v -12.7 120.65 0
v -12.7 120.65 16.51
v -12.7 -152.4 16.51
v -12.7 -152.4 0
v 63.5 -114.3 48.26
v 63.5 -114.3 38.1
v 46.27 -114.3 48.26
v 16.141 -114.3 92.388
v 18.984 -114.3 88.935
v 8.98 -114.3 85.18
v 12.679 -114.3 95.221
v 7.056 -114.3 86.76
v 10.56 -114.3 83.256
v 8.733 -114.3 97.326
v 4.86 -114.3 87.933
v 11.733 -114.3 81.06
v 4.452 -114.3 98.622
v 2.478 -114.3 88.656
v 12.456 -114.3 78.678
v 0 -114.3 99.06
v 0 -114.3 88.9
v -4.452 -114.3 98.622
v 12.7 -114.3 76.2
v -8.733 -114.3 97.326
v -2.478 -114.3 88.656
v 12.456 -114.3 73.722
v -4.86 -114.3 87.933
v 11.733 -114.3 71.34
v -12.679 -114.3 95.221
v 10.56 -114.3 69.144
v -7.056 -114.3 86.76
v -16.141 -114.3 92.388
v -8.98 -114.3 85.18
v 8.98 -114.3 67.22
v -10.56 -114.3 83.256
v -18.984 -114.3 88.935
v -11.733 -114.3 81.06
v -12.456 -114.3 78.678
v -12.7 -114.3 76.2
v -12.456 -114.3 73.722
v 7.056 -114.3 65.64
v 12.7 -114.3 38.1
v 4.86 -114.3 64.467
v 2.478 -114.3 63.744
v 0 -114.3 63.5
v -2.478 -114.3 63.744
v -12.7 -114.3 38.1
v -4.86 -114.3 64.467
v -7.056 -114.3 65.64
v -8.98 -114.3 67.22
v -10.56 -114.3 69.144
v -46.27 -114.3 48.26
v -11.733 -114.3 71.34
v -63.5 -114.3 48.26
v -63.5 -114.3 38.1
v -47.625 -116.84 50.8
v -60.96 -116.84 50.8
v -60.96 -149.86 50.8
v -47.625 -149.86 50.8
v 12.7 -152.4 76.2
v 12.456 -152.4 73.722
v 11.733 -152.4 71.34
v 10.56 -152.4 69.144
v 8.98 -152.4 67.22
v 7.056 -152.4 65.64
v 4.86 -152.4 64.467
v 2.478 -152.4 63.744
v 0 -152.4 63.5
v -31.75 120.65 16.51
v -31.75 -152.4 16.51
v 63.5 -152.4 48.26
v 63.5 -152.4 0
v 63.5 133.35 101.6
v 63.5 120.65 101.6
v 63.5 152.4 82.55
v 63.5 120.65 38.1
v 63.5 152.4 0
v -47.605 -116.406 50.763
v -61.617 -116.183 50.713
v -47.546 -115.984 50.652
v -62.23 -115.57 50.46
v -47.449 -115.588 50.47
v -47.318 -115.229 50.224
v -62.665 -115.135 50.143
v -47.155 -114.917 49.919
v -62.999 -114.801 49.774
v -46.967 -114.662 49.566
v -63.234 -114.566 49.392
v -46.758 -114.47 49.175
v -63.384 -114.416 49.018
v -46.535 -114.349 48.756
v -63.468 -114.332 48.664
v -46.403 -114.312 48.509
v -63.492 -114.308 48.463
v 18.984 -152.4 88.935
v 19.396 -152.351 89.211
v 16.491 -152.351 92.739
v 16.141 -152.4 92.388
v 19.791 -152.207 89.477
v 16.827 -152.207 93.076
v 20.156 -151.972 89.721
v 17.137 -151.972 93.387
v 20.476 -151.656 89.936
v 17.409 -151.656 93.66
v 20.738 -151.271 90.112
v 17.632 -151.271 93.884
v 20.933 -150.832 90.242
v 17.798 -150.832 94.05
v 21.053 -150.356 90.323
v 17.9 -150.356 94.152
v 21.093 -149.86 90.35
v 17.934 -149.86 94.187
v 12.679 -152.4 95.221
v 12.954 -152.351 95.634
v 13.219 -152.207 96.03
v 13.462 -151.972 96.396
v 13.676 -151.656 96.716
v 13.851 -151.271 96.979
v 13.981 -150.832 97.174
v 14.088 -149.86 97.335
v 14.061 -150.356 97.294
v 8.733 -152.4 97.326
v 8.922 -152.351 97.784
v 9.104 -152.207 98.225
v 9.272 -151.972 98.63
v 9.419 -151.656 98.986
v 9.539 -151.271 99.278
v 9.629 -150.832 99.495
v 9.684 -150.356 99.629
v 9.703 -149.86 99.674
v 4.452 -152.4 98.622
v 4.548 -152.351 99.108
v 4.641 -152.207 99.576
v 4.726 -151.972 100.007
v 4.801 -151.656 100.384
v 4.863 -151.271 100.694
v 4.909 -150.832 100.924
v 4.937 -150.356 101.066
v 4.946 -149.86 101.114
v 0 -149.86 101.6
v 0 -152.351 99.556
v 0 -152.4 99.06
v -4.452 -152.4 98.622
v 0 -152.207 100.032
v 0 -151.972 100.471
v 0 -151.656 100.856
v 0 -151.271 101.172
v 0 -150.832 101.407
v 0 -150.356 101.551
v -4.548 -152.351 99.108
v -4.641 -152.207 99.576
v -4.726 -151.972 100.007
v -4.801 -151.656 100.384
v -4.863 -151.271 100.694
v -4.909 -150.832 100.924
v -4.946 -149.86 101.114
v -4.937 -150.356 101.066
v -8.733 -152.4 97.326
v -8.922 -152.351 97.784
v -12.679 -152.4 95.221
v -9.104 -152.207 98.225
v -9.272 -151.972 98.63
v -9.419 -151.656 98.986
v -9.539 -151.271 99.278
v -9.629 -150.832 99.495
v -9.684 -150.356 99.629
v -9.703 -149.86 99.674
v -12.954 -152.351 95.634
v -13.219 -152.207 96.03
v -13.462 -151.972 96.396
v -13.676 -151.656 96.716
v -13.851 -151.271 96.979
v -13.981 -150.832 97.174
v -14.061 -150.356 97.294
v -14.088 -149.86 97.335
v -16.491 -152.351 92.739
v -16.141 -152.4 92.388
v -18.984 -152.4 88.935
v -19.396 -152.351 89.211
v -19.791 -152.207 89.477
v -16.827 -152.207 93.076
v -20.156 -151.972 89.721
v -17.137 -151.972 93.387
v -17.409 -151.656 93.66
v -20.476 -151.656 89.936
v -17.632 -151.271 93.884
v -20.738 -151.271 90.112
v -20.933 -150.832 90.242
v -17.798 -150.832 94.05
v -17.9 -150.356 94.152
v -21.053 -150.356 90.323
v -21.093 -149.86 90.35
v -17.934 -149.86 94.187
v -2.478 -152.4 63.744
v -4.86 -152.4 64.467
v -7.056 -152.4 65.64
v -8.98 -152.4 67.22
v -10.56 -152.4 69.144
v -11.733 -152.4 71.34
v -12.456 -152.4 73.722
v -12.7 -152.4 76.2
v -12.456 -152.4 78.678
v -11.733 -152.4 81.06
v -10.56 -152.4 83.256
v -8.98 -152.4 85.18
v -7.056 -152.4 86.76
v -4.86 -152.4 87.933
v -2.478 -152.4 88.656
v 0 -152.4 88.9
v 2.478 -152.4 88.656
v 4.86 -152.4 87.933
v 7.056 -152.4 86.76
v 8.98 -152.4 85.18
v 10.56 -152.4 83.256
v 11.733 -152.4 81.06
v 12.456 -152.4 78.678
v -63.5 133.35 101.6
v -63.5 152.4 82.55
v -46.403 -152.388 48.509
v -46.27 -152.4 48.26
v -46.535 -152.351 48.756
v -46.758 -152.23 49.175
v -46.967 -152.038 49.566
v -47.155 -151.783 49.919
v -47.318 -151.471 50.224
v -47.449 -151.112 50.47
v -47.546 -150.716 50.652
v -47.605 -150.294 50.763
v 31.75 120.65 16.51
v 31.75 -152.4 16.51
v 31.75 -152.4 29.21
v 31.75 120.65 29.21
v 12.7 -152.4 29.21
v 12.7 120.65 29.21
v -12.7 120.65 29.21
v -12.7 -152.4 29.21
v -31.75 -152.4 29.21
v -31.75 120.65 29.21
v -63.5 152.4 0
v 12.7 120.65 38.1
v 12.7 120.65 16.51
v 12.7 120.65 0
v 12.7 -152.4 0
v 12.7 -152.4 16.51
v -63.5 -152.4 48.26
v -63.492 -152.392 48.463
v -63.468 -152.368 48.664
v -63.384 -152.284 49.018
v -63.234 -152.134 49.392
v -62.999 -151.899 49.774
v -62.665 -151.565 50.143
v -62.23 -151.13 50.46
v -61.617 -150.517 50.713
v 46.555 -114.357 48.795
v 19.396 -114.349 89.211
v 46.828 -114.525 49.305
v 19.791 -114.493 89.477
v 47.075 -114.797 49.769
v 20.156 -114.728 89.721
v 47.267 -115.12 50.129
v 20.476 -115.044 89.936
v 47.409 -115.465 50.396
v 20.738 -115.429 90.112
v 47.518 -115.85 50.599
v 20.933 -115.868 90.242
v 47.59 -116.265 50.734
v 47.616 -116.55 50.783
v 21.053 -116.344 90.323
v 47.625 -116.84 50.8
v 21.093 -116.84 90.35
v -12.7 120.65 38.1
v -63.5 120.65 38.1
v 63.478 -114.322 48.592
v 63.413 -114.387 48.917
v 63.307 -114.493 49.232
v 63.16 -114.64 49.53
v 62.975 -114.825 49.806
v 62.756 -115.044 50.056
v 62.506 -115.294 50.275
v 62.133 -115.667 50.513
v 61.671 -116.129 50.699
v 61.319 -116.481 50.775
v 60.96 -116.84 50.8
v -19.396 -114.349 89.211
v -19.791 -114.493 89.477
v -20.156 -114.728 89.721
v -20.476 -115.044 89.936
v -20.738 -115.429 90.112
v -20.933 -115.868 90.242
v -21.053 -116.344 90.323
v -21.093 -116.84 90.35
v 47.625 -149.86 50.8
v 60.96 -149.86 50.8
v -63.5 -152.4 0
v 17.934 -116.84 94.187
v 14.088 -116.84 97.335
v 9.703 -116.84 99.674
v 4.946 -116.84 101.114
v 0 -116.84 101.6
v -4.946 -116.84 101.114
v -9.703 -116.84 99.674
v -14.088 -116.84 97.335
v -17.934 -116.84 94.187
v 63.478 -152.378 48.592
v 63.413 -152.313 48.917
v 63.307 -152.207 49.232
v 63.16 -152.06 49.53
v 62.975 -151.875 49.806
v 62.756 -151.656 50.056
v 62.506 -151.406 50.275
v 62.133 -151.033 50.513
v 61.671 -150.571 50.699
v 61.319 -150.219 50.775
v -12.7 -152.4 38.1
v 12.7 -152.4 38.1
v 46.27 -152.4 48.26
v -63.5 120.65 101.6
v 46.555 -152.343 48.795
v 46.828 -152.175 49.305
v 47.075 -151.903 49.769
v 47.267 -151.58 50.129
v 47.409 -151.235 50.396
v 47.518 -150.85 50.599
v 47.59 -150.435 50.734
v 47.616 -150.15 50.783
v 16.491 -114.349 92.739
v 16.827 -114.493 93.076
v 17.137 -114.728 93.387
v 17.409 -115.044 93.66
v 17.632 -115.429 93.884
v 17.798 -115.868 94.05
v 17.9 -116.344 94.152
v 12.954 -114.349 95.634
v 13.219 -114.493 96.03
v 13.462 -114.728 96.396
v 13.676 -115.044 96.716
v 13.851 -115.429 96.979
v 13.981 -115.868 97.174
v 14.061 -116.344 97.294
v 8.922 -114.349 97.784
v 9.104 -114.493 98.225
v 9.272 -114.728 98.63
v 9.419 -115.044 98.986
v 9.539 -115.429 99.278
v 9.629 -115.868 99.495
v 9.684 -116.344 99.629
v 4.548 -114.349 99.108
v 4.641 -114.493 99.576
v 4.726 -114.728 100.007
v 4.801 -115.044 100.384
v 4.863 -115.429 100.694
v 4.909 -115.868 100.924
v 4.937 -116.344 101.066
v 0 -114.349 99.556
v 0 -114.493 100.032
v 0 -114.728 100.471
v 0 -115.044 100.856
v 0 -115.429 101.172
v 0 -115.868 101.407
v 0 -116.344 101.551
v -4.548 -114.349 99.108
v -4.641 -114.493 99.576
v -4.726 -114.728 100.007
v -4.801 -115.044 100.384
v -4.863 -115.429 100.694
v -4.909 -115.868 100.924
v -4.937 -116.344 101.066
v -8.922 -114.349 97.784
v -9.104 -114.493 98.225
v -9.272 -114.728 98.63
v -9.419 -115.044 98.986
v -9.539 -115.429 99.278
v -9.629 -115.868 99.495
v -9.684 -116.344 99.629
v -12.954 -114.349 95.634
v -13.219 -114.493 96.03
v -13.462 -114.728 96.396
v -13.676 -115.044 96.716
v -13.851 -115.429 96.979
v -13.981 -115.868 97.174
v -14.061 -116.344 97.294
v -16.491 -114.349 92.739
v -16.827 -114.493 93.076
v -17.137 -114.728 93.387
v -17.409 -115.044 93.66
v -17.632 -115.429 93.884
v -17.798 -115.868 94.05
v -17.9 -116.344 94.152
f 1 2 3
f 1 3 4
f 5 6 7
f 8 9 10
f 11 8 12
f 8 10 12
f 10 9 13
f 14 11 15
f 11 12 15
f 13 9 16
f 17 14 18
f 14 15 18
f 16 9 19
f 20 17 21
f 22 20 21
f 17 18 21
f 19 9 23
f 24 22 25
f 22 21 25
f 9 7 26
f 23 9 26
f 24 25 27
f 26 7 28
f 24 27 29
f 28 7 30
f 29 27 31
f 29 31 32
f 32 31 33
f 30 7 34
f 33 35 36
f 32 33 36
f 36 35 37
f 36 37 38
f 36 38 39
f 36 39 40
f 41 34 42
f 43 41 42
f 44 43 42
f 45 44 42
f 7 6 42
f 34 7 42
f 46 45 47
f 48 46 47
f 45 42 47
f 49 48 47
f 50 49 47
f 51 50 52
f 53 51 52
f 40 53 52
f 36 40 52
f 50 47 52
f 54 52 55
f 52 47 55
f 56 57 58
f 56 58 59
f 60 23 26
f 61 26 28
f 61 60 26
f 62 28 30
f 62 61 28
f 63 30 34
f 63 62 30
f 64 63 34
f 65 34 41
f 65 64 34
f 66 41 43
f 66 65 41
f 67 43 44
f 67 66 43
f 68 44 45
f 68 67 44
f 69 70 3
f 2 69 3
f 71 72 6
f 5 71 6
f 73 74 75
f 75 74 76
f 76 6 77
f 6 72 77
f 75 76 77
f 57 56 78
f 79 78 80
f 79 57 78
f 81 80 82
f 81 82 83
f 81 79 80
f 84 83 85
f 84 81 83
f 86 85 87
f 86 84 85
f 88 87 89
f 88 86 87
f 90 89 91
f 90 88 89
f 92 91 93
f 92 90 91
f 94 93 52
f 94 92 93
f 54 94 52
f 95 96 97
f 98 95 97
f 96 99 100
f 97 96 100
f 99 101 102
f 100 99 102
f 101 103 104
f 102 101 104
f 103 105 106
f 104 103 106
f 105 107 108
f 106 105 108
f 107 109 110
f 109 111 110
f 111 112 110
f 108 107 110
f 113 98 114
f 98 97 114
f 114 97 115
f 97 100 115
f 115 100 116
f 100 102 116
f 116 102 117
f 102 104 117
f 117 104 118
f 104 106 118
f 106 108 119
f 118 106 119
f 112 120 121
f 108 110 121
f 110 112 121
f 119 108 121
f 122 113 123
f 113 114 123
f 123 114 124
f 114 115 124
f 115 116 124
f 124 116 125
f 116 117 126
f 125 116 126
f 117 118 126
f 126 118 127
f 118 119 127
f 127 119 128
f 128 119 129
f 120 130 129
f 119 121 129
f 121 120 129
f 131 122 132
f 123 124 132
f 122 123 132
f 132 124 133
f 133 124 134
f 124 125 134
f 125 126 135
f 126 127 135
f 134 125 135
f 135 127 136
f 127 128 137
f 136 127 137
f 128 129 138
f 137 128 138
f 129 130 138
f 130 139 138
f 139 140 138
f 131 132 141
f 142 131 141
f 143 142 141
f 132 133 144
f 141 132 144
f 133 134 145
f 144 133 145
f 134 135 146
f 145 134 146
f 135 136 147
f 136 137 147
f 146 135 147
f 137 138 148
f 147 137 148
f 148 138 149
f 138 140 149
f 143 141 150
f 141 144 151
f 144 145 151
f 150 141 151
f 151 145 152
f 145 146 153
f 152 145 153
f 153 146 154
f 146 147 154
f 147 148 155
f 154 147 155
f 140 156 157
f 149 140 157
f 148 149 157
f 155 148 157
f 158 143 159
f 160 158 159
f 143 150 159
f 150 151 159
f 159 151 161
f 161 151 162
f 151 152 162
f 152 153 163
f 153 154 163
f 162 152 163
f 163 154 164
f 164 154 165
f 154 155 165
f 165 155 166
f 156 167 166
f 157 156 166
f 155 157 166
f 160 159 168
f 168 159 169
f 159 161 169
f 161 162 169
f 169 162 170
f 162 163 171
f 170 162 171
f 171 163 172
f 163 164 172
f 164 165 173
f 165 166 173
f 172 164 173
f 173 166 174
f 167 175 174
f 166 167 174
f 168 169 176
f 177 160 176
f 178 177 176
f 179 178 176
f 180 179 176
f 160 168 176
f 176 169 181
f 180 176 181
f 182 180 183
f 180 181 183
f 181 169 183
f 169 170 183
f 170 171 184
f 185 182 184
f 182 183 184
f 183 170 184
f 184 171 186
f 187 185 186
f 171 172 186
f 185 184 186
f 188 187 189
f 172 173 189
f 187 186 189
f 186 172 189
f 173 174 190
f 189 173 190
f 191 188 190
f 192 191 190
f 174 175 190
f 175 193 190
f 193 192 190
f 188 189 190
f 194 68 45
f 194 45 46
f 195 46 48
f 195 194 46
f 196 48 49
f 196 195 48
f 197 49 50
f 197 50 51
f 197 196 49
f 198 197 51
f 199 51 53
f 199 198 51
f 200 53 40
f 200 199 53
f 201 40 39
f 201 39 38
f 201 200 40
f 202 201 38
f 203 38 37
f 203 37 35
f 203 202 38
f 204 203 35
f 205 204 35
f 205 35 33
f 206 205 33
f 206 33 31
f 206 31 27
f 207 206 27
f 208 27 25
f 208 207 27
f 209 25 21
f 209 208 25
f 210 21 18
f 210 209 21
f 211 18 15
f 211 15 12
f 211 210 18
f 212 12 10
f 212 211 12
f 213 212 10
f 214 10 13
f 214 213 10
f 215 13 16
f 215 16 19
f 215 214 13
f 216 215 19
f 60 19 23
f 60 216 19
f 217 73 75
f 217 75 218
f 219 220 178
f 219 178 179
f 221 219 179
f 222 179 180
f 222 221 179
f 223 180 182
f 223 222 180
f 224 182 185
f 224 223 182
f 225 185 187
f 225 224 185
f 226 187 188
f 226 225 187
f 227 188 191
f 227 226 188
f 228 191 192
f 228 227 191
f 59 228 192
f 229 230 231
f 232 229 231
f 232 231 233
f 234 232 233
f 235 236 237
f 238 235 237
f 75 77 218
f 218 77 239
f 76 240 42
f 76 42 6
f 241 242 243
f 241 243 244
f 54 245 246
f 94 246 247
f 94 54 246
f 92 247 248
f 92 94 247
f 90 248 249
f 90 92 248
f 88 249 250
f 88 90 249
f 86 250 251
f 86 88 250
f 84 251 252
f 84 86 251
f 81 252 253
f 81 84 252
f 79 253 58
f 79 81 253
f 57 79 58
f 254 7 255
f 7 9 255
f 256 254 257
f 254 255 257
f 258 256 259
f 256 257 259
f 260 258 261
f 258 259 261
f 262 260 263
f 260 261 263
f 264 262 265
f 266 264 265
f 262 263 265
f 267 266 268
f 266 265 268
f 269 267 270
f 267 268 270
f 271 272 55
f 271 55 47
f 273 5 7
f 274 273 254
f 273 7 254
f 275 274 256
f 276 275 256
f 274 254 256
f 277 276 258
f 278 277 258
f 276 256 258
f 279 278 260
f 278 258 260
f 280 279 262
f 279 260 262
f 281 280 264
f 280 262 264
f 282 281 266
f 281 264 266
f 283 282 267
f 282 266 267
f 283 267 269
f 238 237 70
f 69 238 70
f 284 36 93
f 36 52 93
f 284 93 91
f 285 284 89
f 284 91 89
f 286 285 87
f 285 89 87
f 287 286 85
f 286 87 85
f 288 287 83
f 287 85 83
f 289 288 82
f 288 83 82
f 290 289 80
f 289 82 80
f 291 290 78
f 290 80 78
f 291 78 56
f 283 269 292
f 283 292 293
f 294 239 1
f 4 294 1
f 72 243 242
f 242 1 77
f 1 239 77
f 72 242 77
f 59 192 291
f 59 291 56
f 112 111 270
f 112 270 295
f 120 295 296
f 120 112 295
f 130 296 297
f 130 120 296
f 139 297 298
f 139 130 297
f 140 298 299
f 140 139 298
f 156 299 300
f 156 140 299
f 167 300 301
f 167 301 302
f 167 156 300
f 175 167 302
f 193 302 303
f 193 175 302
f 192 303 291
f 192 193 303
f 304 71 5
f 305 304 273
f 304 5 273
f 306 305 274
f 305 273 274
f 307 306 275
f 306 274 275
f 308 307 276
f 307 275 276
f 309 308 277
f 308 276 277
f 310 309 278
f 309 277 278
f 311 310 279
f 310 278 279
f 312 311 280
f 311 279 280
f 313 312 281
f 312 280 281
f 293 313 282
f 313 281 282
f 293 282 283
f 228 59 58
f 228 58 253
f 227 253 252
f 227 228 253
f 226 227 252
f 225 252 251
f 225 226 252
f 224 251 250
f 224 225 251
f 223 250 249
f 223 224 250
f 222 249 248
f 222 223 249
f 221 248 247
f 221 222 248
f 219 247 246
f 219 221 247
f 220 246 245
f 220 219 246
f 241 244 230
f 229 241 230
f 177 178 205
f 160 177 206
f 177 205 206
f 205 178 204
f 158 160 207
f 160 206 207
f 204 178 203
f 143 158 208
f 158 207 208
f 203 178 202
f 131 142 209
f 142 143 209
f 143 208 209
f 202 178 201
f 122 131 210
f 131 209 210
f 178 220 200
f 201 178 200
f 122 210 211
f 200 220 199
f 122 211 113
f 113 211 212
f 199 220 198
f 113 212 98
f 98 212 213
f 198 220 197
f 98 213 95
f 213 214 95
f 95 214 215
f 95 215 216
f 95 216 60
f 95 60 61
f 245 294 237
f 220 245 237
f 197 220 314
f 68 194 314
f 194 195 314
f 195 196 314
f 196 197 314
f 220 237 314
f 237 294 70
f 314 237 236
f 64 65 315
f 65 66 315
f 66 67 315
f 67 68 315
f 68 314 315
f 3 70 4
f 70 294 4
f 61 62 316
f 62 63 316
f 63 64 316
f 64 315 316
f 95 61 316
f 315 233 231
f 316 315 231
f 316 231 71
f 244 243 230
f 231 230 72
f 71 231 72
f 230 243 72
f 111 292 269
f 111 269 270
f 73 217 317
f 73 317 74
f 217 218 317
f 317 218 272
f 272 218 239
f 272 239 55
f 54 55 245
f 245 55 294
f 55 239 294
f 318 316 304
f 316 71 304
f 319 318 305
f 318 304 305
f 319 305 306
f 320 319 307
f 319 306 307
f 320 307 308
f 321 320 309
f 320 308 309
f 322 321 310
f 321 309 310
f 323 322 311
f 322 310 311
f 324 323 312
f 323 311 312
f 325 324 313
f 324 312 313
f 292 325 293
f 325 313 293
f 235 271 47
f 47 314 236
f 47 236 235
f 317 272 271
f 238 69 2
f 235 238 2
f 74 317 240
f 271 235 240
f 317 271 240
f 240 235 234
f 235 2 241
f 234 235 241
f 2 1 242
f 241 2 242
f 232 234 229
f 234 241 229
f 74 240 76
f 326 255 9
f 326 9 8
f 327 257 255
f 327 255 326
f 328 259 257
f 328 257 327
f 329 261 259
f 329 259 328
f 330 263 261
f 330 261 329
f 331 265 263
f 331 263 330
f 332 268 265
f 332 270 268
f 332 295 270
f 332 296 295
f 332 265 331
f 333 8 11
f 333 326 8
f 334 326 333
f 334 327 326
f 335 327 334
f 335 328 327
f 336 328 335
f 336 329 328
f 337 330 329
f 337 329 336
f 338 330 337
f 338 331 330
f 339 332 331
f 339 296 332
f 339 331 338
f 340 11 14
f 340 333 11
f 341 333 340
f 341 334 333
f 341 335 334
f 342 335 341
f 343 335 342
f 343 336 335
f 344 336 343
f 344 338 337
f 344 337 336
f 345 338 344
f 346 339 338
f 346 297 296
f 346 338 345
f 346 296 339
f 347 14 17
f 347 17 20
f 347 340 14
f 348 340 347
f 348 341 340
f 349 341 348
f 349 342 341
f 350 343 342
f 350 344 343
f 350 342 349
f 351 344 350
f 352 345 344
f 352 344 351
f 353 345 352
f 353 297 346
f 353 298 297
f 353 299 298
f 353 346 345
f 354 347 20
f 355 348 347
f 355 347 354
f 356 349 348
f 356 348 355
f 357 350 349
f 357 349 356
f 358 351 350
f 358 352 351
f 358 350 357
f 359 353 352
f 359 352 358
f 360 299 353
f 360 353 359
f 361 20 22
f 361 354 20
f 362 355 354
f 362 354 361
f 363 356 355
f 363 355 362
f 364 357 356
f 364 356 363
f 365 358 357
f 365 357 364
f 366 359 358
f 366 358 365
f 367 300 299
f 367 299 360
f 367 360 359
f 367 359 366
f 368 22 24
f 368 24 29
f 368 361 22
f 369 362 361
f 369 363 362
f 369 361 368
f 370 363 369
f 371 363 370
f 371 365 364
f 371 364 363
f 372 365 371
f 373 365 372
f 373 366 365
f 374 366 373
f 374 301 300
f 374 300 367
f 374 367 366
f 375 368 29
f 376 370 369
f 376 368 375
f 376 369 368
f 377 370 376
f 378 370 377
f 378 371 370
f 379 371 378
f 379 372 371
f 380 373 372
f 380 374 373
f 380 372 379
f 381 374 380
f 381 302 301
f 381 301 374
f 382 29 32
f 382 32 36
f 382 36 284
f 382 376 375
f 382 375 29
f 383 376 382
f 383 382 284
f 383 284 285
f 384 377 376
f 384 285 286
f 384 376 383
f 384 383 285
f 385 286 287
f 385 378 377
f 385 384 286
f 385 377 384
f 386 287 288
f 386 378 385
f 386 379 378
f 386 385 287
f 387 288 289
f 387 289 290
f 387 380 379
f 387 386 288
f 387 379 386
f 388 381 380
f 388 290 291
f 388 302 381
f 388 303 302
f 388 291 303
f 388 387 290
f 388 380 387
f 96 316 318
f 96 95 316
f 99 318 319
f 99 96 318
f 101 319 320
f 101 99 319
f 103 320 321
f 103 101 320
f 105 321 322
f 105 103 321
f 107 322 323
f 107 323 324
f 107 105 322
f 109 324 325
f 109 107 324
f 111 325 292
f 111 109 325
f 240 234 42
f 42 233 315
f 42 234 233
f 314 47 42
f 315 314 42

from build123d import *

# Parameters (mm, degrees)
F1_DEPTH  = 38.1
F3_DEPTH  = 273.05
F4_W      = 25.4
F4_H      = 38.1
F4_W_2    = 50.8
F5_DEPTH  = 12.7
F7_DEPTH  = 38.1
F8_R      = 2.54
F10_DEPTH = 63.5
F11_SIZE  = 19.05


with BuildPart() as f1:
    # F0 (on Top) → F1 (new body)
    with BuildSketch(Plane.XY):
        Polygon((-63.5, -152.4), (63.5, -152.4), (63.5, 152.4), (-63.5, 152.4), (-63.5, 114.3), (-63.5, 101.6), (-63.5, 88.9), align=None)
    extrude(amount=F1_DEPTH)

    # F2 (on face) → F3 (cut)
    with BuildSketch(Plane.XZ.offset(152.4)):
        Polygon((-12.7, 0), (0, 0), (12.7, 0), (12.7, 16.51), (31.75, 16.51), (31.75, 29.21), (12.7, 29.21), (12.7, 38.1), (-12.7, 38.1), (-12.7, 29.21), (-31.75, 29.21), (-31.75, 16.51), (-12.7, 16.51), align=None)
    extrude(amount=-F3_DEPTH, mode=Mode.SUBTRACT)

    # F4 (on face) → F5 (join)
    with BuildSketch(Plane.XY.offset(38.1)):
        with Locations((0, -133.35)):
            Rectangle(F4_W, F4_H)
        with Locations((-38.1, -133.35)):
            Rectangle(F4_W_2, F4_H)
        with Locations((38.1, -133.35)):
            Rectangle(F4_W_2, F4_H)
    extrude(amount=F5_DEPTH)

    # F6 (on face) → F7 (join)
    with BuildSketch(Plane.XZ.offset(152.4)):
        with BuildLine():
            Line((-47.625, 50.8), (0, 50.8))
            Line((0, 50.8), (47.625, 50.8))
            Line((47.625, 50.8), (21.0934256055, 90.3501730104))
            ThreePointArc((21.0934256055, 90.3501730104), (0, 101.6), (-21.0934256055, 90.3501730104))
            Line((-21.0934256055, 90.3501730104), (-47.625, 50.8))
        make_face()
        with BuildLine():
            ThreePointArc((12.7, 76.2), (8.9802561211, 67.2197438789), (0, 63.5))
            ThreePointArc((0, 63.5), (-8.9802561211, 85.1802561211), (12.7, 76.2))
        make_face(mode=Mode.SUBTRACT)
    extrude(amount=-F7_DEPTH)

    # F8
    f8_edges = [f1.edges().sort_by_distance(p)[0] for p in [
        (-55.5625, -152.4, 50.8),
        (55.5625, -152.4, 50.8),
        (34.359213, -152.4, 70.575087),
        (63.5, -133.35, 50.8),
        (-55.5625, -114.3, 50.8),
        (55.5625, -114.3, 50.8),
        (34.359213, -114.3, 70.575087),
        (0, -152.4, 101.6),
        (0, -114.3, 101.6),
        (-34.359213, -152.4, 70.575087),
        (-34.359213, -114.3, 70.575087),
        (-63.5, -133.35, 50.8),
    ]]
    fillet(f8_edges, radius=F8_R)

    # F9 (on face) → F10 (join)
    with BuildSketch(Plane.XY.offset(38.1)):
        Polygon((63.5, 152.4), (-63.5, 152.4), (-63.5, 120.65), (-12.7, 120.65), (12.7, 120.65), (63.5, 120.65), align=None)
    extrude(amount=F10_DEPTH)

    # F11
    f11_edges = [f1.edges().sort_by_distance(p)[0] for p in [
        (0, 152.4, 101.6),
    ]]
    chamfer(f11_edges, length=F11_SIZE)


solid = f1.part
